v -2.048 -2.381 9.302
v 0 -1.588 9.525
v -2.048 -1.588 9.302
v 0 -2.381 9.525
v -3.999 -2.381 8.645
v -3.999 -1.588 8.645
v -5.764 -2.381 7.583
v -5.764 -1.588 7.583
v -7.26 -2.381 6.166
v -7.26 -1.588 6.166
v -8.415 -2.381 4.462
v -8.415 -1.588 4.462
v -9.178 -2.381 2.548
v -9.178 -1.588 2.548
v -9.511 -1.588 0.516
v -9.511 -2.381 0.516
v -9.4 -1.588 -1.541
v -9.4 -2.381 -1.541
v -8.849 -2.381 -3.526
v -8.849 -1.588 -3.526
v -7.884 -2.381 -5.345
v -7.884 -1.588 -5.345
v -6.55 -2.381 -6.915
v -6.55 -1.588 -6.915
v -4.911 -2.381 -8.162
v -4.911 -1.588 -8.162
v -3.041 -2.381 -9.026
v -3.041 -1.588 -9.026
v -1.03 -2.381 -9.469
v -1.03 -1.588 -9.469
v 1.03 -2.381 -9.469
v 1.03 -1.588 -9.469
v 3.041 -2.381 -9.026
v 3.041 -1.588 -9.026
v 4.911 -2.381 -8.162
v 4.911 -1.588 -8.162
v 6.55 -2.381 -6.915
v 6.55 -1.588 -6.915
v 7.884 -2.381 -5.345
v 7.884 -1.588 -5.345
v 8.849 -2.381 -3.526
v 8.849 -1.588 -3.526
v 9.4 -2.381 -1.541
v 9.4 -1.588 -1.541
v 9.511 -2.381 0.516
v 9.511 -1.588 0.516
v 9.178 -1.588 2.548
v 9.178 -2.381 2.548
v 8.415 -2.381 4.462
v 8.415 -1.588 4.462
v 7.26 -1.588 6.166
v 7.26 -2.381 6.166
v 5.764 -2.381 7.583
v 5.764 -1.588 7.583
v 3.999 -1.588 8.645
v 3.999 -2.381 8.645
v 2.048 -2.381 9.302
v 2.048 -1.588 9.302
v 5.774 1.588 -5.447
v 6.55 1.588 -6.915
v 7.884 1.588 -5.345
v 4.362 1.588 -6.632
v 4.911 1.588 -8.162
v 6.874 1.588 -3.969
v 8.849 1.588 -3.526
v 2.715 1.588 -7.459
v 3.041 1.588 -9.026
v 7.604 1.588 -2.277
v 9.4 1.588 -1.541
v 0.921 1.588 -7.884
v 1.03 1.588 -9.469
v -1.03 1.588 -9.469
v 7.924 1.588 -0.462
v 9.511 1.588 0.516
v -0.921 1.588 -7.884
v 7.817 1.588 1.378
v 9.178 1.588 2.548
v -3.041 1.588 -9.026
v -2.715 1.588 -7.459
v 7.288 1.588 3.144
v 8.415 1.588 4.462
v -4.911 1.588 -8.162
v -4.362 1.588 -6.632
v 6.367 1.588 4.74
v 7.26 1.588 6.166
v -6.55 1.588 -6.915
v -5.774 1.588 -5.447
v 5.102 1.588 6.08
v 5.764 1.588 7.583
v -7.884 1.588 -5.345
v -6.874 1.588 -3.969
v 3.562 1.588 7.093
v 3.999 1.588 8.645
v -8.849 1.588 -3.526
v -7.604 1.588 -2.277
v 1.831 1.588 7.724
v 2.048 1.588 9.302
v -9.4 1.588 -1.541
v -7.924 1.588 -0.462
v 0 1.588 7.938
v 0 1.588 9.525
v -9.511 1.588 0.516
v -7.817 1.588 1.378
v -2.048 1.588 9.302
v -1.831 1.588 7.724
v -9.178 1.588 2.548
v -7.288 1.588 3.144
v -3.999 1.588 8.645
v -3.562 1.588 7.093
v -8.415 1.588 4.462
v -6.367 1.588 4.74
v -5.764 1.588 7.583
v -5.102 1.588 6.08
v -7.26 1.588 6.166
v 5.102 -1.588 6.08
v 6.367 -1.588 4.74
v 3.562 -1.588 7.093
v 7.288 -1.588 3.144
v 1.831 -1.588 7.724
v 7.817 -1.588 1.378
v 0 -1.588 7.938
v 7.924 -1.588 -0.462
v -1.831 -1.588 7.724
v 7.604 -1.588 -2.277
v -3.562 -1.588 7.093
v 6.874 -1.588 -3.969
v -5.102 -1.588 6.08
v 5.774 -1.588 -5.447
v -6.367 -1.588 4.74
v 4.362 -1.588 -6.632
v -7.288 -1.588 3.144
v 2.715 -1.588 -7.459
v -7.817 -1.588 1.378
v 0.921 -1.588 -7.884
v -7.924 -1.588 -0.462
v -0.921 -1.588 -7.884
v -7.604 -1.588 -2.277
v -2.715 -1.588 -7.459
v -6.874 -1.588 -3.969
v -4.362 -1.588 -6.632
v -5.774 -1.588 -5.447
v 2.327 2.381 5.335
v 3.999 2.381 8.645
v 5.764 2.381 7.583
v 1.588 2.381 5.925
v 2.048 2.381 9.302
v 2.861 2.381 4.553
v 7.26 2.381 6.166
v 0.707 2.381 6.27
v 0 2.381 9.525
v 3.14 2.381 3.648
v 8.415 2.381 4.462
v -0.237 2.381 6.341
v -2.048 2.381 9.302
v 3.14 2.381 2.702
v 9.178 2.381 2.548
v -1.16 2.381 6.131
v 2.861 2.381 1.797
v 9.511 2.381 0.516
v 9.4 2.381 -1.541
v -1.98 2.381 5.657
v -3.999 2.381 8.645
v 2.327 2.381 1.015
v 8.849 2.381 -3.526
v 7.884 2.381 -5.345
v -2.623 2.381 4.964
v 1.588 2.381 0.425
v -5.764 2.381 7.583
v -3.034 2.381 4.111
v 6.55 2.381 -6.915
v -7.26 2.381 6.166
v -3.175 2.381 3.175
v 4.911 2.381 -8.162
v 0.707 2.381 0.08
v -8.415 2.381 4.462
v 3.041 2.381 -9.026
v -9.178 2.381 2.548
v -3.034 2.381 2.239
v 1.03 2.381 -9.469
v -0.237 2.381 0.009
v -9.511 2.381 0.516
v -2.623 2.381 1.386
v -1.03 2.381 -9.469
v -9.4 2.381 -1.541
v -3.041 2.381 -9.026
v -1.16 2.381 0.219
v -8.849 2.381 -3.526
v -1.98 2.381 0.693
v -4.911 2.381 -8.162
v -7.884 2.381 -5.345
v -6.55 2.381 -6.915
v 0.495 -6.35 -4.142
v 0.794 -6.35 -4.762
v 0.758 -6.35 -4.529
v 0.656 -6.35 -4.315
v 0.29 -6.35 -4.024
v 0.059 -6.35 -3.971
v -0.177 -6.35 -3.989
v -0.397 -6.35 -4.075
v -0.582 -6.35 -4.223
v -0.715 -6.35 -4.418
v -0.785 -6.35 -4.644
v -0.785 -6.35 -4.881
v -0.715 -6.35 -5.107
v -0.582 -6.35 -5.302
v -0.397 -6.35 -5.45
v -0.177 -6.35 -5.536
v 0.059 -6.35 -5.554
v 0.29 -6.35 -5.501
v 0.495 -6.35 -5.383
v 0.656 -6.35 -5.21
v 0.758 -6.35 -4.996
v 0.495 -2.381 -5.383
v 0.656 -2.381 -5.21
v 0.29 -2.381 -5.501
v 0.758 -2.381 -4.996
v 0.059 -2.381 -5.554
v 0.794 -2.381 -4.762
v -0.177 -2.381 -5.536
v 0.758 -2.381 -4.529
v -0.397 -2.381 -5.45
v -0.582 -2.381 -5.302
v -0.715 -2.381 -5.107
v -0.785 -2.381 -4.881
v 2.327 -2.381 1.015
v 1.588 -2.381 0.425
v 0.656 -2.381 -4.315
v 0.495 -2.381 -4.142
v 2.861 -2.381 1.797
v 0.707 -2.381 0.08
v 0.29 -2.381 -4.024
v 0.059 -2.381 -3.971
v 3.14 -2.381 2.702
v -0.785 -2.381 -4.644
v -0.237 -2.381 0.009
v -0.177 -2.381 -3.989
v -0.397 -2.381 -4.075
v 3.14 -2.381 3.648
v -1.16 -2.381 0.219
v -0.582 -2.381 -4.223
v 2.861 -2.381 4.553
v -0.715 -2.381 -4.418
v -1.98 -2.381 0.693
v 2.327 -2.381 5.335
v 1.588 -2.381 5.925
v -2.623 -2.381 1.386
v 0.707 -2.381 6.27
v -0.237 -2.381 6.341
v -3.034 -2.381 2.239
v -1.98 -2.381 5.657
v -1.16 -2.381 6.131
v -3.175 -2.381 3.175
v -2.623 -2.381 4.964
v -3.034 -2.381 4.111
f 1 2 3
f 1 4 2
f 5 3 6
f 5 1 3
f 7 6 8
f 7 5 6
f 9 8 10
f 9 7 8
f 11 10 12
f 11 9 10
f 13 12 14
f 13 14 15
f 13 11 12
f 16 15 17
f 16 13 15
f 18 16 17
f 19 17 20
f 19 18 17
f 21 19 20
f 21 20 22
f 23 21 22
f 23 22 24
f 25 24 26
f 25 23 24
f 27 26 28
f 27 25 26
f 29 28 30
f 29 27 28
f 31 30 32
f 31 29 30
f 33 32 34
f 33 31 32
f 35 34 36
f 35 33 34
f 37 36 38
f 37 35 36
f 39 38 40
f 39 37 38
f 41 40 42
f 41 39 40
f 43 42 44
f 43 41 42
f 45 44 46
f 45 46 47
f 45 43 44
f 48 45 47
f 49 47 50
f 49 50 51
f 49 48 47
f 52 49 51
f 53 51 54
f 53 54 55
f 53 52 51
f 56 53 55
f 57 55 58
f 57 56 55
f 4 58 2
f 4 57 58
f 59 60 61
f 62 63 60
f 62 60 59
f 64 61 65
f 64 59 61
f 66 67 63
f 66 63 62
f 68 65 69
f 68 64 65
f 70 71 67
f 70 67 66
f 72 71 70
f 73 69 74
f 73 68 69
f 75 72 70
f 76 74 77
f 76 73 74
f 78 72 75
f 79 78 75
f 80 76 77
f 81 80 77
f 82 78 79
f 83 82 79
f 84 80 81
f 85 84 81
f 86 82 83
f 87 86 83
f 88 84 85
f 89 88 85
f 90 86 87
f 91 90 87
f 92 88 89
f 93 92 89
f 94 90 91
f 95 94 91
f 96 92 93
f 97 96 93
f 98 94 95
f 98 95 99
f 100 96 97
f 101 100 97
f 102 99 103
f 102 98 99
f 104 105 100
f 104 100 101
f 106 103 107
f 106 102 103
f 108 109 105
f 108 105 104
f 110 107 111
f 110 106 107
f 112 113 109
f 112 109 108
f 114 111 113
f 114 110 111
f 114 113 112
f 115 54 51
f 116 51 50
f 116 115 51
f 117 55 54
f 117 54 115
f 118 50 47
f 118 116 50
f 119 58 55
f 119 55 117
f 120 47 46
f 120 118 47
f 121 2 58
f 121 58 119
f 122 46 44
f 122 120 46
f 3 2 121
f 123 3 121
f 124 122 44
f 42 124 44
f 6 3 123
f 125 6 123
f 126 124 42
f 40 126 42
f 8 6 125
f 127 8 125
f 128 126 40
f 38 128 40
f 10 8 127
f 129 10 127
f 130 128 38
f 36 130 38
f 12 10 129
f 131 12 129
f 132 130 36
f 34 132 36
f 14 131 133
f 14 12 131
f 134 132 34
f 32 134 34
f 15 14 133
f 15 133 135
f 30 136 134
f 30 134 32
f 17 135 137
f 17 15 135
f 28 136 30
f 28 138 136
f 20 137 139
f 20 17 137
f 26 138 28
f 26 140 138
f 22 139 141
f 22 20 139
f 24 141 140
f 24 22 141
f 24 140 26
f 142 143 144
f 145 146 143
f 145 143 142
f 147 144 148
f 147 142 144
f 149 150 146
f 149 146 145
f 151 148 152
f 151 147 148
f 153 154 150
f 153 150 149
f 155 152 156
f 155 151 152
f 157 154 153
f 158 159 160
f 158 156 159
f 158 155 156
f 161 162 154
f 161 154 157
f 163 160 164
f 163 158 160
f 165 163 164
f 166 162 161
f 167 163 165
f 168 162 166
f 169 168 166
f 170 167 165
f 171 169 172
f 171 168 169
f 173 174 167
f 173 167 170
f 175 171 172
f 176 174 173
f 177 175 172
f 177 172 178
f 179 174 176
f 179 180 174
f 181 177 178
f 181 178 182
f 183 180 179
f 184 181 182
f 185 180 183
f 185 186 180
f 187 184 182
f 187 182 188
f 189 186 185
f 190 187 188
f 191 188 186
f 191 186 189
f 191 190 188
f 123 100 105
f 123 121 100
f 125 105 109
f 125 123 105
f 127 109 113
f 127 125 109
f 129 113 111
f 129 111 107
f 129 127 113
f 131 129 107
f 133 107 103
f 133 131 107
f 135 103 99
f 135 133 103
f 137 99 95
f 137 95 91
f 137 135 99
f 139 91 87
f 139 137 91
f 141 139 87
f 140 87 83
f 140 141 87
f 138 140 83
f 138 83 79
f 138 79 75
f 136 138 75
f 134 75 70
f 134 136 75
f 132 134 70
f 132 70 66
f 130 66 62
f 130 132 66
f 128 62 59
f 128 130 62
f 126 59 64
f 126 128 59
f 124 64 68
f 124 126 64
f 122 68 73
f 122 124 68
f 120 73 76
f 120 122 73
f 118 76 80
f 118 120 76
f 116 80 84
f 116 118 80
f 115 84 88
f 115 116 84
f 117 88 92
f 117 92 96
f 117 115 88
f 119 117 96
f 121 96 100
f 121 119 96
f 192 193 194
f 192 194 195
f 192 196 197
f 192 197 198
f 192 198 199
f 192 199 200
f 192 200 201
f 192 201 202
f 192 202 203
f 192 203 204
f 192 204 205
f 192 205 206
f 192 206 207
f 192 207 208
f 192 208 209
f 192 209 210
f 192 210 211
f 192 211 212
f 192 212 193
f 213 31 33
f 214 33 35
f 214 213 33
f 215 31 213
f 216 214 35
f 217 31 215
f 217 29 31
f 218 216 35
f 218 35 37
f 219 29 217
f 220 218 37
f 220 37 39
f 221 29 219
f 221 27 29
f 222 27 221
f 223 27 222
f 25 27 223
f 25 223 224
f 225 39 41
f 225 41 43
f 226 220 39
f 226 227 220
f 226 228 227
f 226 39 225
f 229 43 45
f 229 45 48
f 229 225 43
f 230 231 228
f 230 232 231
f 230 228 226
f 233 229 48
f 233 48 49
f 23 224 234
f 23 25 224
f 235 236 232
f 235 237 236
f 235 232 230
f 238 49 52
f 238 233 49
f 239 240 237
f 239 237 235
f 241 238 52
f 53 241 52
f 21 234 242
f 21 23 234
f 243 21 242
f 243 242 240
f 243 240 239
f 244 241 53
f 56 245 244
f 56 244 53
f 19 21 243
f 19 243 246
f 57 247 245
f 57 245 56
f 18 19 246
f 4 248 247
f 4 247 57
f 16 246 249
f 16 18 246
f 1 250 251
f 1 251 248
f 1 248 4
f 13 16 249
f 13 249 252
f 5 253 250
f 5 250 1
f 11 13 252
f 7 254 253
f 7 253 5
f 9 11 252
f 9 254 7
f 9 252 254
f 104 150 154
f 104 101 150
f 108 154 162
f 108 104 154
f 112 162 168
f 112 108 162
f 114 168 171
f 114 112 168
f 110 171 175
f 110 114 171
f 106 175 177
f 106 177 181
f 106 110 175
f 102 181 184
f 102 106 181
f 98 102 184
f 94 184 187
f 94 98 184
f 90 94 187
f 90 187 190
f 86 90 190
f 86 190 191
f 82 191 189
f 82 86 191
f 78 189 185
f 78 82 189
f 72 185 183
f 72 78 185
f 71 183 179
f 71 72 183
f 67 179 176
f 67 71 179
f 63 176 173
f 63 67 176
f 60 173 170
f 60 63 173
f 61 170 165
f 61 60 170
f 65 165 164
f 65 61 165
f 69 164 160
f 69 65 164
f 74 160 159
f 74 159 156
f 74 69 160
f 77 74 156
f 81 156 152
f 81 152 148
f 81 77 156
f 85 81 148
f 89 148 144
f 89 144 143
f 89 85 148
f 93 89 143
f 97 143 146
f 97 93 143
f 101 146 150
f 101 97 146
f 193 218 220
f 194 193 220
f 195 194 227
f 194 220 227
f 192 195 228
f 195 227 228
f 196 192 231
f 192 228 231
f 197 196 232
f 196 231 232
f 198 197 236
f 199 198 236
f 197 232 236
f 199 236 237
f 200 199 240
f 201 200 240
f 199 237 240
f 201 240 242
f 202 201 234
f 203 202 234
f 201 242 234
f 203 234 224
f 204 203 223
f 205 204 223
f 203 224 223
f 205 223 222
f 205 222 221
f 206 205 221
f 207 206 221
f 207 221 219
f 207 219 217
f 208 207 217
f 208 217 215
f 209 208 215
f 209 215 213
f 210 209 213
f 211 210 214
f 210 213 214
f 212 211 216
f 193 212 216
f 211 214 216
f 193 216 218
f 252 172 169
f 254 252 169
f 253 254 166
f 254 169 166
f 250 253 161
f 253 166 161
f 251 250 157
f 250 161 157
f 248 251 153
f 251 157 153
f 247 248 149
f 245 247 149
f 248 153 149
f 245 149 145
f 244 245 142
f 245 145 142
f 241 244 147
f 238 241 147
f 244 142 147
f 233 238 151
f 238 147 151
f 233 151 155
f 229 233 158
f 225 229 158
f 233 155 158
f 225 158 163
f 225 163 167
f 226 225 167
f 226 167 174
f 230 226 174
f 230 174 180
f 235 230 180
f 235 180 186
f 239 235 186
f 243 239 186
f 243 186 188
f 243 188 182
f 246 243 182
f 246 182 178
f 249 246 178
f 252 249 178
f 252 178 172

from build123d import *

# Parameters (mm, degrees)
F3_D     = 6.35
F4_R     = 0.79375
F5_DEPTH = 3.96875


with BuildPart() as f1:
    # F0 (on Right) → F1 (revolve)
    with BuildSketch(Plane.YZ):
        Polygon((-2.38125, 9.525), (-2.38125, 0), (0, 0), (2.38125, 0), (2.38125, 9.525), (1.5875, 9.525), (1.5875, 7.9375), (-1.5875, 7.9375), (-1.5875, 9.525), align=None)
    revolve(axis=Axis((0, 1.190625, 0), (0, -1, 0)))

    # F3 (through all)
    with Locations(Plane.XZ.offset(2.38125)):
        with Locations((0, 3.175)):
            Hole(F3_D / 2)

    # F4 (on face) → F5 (join)
    with BuildSketch(Plane.XZ.offset(2.38125)):
        with Locations((0, -4.7625)):
            Circle(F4_R)
    extrude(amount=F5_DEPTH)


solid = f1.part
